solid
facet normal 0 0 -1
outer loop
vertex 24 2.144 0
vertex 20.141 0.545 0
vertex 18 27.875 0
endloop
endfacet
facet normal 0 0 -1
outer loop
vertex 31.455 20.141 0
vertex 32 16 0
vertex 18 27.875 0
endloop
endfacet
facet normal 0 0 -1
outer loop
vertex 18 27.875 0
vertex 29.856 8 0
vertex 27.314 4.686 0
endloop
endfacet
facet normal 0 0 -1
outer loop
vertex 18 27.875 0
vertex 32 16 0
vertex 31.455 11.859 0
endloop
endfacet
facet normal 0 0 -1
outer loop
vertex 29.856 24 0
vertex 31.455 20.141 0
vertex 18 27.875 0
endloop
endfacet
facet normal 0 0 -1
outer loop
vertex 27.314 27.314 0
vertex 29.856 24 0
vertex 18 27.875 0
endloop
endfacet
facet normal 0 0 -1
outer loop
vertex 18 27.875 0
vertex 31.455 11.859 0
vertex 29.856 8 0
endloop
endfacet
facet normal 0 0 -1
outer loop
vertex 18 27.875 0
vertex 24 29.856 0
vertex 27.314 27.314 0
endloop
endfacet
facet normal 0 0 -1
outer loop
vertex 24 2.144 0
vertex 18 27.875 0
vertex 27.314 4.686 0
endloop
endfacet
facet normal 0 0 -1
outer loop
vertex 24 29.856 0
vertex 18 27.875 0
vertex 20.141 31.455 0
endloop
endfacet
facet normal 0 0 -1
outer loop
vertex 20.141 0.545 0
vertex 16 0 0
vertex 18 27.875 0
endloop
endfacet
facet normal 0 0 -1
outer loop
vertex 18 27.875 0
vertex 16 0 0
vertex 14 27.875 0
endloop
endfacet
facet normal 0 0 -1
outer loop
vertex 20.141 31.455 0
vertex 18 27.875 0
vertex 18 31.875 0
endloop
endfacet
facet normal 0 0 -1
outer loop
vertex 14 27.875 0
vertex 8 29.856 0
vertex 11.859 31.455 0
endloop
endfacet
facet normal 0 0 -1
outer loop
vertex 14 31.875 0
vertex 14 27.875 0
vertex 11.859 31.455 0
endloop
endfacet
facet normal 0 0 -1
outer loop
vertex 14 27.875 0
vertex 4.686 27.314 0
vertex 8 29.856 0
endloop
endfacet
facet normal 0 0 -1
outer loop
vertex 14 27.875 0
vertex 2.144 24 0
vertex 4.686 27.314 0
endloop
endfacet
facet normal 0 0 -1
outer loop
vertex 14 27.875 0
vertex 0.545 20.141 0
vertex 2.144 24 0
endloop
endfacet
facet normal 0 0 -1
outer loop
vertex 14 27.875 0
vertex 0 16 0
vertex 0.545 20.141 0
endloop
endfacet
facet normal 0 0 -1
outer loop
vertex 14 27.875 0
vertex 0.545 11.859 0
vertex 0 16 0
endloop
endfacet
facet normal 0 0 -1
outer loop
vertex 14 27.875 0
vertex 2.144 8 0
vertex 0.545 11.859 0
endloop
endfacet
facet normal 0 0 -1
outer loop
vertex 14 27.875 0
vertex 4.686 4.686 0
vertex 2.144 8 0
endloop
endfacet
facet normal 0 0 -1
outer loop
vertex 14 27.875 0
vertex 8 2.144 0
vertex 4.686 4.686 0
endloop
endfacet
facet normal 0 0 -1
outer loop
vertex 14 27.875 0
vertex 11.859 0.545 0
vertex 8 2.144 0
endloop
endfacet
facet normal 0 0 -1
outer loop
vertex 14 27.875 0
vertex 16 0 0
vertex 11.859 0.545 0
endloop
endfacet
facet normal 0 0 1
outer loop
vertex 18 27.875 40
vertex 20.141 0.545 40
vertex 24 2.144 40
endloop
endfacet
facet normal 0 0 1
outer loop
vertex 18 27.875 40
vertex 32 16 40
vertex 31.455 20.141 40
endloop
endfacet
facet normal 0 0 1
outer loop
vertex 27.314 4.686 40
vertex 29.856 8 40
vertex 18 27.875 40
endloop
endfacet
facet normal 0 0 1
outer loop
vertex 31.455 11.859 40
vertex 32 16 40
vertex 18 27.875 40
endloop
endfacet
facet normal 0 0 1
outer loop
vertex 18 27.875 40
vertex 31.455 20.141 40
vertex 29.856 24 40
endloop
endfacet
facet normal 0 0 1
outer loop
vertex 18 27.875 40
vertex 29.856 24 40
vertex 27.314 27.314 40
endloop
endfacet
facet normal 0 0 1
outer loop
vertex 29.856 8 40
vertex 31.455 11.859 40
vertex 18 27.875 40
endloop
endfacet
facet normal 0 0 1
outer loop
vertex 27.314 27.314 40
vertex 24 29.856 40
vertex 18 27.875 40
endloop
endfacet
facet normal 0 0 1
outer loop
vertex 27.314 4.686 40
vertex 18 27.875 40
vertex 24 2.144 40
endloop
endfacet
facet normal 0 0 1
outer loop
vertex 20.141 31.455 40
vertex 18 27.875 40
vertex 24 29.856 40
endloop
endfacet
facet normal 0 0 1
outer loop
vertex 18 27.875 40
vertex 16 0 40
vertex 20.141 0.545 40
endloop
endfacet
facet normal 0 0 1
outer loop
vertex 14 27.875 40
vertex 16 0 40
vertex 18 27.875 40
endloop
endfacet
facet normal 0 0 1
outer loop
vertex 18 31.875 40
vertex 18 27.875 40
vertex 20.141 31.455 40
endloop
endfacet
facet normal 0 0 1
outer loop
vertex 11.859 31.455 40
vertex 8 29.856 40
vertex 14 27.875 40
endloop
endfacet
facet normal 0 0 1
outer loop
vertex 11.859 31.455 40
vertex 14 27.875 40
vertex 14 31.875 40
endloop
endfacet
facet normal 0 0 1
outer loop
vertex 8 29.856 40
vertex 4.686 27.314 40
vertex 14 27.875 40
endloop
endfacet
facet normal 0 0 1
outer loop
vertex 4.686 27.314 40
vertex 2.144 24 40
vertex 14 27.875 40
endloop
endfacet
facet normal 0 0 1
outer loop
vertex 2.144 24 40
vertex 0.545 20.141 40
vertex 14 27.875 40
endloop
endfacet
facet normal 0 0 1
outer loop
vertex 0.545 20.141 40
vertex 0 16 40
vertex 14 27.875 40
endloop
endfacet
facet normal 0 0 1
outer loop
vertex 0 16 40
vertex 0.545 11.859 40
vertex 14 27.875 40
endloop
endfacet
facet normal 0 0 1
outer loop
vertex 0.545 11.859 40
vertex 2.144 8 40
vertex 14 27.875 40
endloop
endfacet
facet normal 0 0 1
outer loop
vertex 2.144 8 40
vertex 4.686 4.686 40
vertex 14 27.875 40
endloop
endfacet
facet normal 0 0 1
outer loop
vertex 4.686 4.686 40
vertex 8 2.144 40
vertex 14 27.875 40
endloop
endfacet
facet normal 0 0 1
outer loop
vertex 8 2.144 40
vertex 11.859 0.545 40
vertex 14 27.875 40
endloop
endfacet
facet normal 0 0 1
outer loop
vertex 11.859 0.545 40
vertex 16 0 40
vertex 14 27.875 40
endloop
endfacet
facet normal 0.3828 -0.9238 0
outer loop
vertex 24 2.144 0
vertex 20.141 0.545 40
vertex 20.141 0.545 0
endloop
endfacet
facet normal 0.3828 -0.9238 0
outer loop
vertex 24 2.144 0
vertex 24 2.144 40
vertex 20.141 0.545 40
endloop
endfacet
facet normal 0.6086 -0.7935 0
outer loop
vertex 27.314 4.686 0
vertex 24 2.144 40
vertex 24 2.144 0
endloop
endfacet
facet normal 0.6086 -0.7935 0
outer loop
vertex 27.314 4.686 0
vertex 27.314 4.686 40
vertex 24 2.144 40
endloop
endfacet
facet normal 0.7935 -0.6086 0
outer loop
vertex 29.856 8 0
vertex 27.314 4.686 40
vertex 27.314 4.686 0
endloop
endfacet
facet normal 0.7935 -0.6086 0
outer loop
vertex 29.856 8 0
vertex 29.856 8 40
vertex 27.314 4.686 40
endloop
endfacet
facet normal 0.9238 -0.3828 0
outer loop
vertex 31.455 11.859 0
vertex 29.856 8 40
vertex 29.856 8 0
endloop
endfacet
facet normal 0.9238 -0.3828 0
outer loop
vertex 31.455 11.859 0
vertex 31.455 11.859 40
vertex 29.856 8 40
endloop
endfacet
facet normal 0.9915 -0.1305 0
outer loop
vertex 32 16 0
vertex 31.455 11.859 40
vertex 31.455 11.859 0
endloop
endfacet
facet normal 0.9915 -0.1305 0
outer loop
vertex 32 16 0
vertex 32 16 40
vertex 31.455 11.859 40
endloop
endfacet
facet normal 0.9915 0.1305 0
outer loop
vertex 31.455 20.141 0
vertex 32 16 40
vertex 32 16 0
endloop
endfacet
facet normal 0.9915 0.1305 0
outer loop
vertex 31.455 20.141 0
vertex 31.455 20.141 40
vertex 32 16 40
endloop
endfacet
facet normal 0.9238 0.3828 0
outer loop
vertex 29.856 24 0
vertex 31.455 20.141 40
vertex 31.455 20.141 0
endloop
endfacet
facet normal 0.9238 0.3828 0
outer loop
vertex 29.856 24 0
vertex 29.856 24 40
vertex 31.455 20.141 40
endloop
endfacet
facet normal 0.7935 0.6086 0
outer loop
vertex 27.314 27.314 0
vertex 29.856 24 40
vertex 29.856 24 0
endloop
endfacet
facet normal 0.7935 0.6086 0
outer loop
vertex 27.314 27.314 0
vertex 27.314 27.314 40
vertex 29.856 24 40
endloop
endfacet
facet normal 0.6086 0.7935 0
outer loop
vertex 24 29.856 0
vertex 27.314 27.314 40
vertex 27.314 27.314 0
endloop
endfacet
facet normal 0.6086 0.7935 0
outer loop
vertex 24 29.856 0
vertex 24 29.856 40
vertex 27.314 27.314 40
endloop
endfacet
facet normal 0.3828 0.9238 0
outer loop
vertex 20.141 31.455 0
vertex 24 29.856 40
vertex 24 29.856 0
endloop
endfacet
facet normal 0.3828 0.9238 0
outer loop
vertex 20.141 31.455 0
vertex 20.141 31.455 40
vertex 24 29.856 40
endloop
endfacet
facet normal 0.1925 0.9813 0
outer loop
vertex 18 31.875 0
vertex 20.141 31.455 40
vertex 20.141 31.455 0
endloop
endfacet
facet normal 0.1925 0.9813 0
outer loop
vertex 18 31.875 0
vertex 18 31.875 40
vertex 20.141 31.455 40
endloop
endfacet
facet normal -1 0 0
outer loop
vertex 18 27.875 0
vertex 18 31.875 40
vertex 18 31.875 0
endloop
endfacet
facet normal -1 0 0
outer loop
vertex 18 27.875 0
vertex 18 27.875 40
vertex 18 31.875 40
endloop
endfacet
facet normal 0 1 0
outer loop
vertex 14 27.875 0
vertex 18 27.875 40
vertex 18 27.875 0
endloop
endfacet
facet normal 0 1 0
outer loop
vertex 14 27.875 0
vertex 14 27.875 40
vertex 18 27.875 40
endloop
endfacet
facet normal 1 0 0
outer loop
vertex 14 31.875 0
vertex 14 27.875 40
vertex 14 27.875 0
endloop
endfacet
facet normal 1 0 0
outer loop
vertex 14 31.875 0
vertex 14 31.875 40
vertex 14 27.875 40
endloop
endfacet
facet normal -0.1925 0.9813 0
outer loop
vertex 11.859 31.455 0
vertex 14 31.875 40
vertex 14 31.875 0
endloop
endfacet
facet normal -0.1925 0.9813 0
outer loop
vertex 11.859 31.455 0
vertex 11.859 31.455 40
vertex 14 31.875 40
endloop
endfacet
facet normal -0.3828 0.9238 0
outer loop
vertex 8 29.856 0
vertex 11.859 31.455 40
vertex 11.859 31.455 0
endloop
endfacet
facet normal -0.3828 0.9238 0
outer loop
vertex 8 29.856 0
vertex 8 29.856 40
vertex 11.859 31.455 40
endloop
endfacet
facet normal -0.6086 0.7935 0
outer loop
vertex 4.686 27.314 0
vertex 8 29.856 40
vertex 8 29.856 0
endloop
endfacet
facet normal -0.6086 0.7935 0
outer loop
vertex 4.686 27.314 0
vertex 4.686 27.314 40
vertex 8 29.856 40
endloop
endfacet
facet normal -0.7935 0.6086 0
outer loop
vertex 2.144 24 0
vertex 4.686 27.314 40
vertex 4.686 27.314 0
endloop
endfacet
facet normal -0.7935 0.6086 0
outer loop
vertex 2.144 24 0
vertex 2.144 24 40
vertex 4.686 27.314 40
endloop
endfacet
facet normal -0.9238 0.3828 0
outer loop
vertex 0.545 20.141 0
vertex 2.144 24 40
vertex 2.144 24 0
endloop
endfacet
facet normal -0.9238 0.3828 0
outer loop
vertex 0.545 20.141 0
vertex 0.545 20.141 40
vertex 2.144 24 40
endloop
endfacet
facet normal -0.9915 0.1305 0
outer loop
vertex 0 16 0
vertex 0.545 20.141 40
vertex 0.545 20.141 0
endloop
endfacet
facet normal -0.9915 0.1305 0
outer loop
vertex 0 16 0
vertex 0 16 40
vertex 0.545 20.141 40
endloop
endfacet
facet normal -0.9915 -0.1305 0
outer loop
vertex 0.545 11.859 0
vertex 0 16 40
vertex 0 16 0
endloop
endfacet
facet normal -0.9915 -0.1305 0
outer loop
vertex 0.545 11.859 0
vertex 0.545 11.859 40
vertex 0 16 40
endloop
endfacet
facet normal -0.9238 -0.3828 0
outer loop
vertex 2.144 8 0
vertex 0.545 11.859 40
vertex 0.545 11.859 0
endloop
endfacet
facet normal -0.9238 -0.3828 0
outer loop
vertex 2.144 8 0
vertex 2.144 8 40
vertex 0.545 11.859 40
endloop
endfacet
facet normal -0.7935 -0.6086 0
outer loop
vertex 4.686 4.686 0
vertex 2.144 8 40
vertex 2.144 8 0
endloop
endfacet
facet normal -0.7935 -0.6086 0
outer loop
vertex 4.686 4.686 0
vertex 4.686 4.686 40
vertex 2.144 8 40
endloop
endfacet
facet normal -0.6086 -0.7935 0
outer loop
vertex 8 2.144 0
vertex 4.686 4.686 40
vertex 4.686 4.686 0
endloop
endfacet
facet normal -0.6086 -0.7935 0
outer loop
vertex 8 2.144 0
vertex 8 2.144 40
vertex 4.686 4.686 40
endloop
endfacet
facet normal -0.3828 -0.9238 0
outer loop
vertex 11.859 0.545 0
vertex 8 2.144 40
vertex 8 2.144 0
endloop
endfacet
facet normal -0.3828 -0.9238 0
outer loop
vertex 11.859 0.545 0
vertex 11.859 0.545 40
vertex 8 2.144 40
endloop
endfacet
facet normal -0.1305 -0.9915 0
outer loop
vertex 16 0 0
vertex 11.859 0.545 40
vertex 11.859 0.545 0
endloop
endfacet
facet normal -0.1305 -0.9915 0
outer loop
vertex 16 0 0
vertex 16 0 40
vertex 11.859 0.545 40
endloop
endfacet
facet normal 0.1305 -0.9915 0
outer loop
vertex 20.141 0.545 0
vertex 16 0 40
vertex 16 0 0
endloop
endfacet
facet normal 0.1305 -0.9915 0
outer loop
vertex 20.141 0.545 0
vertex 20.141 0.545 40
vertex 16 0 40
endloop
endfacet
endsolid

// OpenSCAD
$fn = 32;

// ----------------------------------------------------------------------
// Keyway shaft: d32 shaft, key 4 x 4 mm
// ----------------------------------------------------------------------

// --- parameters (mm) ---
shaft_r = 16;             // shaft radius
key_w = 4;                // keyway width
key_d = 4;                // keyway depth below the surface line
plate_t = 40;             // shaft length, Z (extrusion height)
fit_tol = 0.05;           // declared fit tolerance (prompt contract)
free_tol = 0.3;           // declared free tolerance (prompt contract)

shaft_d = 2 * shaft_r;  // shaft diameter
circle_step = 15;  // polygon sampling step, degrees

profile = [[11.859, 31.455], [8, 29.856], [4.686, 27.314], [2.144, 24], [0.545, 20.141], [0, 16], [0.545, 11.859], [2.144, 8], [4.686, 4.686], [8, 2.144], [11.859, 0.545], [16, 0], [20.141, 0.545], [24, 2.144], [27.314, 4.686], [29.856, 8], [31.455, 11.859], [32, 16], [31.455, 20.141], [29.856, 24], [27.314, 27.314], [24, 29.856], [20.141, 31.455], [18, 31.875], [18, 27.875], [14, 27.875], [14, 31.875]];  // primary outline, 27 points, counter clockwise

// --- the one profile operation ---
linear_extrude(height = plate_t) polygon(points = profile);
